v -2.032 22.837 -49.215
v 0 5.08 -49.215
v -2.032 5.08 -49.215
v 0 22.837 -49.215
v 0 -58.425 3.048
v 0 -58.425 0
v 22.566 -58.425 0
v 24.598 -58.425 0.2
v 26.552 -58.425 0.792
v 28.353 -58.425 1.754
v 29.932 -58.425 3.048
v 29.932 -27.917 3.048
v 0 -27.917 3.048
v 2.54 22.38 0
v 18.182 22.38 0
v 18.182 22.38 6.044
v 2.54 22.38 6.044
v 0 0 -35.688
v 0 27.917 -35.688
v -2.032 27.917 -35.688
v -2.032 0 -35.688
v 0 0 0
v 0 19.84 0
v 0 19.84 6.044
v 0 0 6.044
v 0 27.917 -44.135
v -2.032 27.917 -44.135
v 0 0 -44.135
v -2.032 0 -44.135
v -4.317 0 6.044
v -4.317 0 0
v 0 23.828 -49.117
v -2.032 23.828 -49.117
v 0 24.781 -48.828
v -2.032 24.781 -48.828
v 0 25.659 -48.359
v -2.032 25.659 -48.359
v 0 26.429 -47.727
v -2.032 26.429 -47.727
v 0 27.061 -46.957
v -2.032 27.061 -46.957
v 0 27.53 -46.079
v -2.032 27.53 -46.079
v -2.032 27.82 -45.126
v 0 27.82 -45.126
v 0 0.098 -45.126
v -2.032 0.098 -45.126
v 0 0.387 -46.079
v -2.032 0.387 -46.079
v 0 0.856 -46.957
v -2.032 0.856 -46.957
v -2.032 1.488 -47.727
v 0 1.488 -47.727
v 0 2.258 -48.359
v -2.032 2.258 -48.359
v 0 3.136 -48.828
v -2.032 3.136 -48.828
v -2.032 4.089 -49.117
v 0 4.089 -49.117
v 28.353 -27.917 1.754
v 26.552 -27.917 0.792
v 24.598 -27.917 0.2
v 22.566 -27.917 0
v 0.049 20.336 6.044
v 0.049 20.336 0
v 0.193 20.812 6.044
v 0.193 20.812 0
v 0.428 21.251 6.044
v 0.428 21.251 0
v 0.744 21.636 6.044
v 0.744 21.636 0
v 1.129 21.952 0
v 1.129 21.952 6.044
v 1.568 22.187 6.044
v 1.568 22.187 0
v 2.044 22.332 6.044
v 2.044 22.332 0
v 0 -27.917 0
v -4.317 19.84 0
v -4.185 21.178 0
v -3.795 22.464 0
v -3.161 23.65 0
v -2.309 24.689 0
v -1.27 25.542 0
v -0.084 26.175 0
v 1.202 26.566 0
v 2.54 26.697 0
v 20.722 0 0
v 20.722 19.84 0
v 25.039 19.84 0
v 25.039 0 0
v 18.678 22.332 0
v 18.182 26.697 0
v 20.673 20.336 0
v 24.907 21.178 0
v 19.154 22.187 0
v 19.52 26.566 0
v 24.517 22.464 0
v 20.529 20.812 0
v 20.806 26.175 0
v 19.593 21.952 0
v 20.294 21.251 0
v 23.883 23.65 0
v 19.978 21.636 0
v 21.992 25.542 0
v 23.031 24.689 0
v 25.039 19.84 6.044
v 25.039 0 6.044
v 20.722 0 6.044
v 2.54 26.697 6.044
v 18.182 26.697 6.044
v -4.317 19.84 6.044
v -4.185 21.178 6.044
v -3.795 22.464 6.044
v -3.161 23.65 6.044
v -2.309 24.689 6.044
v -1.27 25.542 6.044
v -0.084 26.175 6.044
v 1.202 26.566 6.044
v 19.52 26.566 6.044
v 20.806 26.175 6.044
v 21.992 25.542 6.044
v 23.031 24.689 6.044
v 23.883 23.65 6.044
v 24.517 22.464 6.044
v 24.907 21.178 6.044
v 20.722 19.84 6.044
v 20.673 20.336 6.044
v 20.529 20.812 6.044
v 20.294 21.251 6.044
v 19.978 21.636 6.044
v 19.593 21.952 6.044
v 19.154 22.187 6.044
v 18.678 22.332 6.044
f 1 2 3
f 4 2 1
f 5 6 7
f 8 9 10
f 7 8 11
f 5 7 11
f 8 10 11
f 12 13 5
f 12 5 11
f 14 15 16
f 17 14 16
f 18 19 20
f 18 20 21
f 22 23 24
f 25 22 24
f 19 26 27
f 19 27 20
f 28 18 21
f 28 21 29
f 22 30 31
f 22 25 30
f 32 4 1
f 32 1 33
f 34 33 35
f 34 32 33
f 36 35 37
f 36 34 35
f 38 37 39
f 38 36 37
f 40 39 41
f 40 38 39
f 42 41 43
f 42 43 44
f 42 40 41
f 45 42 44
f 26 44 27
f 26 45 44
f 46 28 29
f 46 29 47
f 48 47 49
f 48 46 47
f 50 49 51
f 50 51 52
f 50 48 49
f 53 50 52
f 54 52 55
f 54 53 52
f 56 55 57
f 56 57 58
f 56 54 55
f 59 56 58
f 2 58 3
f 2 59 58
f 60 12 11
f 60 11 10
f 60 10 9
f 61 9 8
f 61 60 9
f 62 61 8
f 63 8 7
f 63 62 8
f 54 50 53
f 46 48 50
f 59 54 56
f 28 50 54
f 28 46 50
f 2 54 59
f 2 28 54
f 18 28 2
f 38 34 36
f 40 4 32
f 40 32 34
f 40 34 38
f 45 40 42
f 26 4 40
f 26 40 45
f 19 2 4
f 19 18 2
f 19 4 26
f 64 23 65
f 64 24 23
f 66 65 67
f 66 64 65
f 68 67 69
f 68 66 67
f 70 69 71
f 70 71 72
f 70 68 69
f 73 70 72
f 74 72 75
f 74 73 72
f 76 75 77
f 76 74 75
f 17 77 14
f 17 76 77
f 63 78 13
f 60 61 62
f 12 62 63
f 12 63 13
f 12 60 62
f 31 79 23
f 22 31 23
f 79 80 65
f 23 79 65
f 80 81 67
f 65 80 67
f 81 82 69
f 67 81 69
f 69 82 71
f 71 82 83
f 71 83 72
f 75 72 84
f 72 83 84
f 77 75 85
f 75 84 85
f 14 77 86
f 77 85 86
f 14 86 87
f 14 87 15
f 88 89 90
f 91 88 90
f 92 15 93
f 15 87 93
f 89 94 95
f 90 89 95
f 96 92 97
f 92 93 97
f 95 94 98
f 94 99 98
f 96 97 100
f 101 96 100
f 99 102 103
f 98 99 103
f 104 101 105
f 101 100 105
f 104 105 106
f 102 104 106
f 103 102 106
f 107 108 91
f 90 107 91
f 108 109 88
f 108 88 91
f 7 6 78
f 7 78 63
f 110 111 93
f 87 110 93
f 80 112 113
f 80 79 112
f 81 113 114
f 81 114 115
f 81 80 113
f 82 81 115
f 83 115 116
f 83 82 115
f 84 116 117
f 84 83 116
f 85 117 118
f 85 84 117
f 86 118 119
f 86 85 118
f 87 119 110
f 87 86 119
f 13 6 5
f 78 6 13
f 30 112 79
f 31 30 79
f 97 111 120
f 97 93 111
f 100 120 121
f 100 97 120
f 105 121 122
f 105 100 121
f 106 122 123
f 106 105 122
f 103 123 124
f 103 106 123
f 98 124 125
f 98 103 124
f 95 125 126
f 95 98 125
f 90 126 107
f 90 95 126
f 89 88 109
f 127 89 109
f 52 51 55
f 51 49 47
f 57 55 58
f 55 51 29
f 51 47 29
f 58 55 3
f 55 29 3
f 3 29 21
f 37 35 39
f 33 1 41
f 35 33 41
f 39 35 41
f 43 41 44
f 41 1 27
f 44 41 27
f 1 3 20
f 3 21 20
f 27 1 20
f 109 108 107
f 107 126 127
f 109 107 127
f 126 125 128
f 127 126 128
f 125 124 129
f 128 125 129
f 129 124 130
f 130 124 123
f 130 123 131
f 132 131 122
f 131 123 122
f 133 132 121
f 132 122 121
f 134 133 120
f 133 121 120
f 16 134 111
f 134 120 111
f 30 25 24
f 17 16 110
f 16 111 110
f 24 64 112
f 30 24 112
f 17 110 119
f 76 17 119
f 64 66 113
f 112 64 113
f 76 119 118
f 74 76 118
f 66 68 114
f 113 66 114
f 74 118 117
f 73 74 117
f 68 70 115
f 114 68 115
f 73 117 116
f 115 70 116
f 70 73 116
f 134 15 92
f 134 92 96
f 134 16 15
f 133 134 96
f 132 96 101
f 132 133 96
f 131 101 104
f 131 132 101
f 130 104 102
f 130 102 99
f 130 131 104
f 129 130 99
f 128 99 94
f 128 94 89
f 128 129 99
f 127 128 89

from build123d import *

# Parameters (mm, degrees)
F1_W        = 4.31708619
F1_H        = 6.0439207591
F3_W        = 29.9317967147
F3_H        = 30.5074118078
F4_DEPTH    = 3.048
F5_T1_DEPTH = 67.3373928333
F7_DEPTH    = 2.032


# Not quite as in the source:
# - a fillet or chamfer that OpenCascade refuses, or shapes differently, is made with other operations: its cross-section is extruded or revolved along the edge and cut away or added


with BuildPart() as f2:
    # F2: sweep along a path in F0
    with BuildLine(Plane.XY) as f2_path:
        Line((0, 0), (0, 19.8403237551))
        ThreePointArc((0, 19.8403237551), (0.7439487758, 21.6363749794), (2.54, 22.3803237551))
        Line((2.54, 22.3803237551), (18.1820148295, 22.3803237551))
        ThreePointArc((18.1820148295, 22.3803237551), (19.9780660537, 21.6363749794), (20.7220148295, 19.8403237551))
        Line((20.7220148295, 19.8403237551), (20.7220148295, 0))
    # F1 (on Front) → F2 (sweep)
    with BuildSketch(Plane.XZ):
        with Locations((-2.158543095, 3.0219603796)):
            Rectangle(F1_W, F1_H)
    sweep(path=f2_path.line)


with BuildPart() as f4:
    # F3 (on Top) → F4 (new body)
    with BuildSketch(Plane.XY):
        with Locations((14.9658983573, -43.1708637625)):
            Rectangle(F3_W, F3_H)
    extrude(amount=F4_DEPTH)

    # F5: fillet of radius 10.4245741623 on 1 edges, made by hand

    # F5_s2 → F5_t1 (cut)
    with BuildSketch(Plane.XZ.offset(9.5021673459)):
        with BuildLine():
            ThreePointArc((29.9317967147, 3.048), (26.5516568822, 0.792092891), (22.5658005096, 0))
            Line((22.5658005096, 0), (29.9317967147, 0))
            Line((29.9317967147, 0), (29.9317967147, 3.048))
        make_face()
    extrude(amount=F5_T1_DEPTH, mode=Mode.SUBTRACT)


with BuildPart() as f7:
    # F6 (on Right) → F7 (new body)
    with BuildSketch(Plane.YZ):
        with BuildLine():
            ThreePointArc((0, -44.1347840559), (1.4878975516, -47.7268865044), (5.08, -49.2147840559))
            Line((5.08, -49.2147840559), (22.837155996, -49.2147840559))
            ThreePointArc((22.837155996, -49.2147840559), (26.4292584444, -47.7268865044), (27.917155996, -44.1347840559))
            Line((27.917155996, -44.1347840559), (27.917155996, -35.6879122555))
            Line((27.917155996, -35.6879122555), (0, -35.6879122555))
            Line((0, -35.6879122555), (0, -44.1347840559))
        make_face()
    extrude(amount=-F7_DEPTH)


solid = Compound([f2.part, f4.part, f7.part])
